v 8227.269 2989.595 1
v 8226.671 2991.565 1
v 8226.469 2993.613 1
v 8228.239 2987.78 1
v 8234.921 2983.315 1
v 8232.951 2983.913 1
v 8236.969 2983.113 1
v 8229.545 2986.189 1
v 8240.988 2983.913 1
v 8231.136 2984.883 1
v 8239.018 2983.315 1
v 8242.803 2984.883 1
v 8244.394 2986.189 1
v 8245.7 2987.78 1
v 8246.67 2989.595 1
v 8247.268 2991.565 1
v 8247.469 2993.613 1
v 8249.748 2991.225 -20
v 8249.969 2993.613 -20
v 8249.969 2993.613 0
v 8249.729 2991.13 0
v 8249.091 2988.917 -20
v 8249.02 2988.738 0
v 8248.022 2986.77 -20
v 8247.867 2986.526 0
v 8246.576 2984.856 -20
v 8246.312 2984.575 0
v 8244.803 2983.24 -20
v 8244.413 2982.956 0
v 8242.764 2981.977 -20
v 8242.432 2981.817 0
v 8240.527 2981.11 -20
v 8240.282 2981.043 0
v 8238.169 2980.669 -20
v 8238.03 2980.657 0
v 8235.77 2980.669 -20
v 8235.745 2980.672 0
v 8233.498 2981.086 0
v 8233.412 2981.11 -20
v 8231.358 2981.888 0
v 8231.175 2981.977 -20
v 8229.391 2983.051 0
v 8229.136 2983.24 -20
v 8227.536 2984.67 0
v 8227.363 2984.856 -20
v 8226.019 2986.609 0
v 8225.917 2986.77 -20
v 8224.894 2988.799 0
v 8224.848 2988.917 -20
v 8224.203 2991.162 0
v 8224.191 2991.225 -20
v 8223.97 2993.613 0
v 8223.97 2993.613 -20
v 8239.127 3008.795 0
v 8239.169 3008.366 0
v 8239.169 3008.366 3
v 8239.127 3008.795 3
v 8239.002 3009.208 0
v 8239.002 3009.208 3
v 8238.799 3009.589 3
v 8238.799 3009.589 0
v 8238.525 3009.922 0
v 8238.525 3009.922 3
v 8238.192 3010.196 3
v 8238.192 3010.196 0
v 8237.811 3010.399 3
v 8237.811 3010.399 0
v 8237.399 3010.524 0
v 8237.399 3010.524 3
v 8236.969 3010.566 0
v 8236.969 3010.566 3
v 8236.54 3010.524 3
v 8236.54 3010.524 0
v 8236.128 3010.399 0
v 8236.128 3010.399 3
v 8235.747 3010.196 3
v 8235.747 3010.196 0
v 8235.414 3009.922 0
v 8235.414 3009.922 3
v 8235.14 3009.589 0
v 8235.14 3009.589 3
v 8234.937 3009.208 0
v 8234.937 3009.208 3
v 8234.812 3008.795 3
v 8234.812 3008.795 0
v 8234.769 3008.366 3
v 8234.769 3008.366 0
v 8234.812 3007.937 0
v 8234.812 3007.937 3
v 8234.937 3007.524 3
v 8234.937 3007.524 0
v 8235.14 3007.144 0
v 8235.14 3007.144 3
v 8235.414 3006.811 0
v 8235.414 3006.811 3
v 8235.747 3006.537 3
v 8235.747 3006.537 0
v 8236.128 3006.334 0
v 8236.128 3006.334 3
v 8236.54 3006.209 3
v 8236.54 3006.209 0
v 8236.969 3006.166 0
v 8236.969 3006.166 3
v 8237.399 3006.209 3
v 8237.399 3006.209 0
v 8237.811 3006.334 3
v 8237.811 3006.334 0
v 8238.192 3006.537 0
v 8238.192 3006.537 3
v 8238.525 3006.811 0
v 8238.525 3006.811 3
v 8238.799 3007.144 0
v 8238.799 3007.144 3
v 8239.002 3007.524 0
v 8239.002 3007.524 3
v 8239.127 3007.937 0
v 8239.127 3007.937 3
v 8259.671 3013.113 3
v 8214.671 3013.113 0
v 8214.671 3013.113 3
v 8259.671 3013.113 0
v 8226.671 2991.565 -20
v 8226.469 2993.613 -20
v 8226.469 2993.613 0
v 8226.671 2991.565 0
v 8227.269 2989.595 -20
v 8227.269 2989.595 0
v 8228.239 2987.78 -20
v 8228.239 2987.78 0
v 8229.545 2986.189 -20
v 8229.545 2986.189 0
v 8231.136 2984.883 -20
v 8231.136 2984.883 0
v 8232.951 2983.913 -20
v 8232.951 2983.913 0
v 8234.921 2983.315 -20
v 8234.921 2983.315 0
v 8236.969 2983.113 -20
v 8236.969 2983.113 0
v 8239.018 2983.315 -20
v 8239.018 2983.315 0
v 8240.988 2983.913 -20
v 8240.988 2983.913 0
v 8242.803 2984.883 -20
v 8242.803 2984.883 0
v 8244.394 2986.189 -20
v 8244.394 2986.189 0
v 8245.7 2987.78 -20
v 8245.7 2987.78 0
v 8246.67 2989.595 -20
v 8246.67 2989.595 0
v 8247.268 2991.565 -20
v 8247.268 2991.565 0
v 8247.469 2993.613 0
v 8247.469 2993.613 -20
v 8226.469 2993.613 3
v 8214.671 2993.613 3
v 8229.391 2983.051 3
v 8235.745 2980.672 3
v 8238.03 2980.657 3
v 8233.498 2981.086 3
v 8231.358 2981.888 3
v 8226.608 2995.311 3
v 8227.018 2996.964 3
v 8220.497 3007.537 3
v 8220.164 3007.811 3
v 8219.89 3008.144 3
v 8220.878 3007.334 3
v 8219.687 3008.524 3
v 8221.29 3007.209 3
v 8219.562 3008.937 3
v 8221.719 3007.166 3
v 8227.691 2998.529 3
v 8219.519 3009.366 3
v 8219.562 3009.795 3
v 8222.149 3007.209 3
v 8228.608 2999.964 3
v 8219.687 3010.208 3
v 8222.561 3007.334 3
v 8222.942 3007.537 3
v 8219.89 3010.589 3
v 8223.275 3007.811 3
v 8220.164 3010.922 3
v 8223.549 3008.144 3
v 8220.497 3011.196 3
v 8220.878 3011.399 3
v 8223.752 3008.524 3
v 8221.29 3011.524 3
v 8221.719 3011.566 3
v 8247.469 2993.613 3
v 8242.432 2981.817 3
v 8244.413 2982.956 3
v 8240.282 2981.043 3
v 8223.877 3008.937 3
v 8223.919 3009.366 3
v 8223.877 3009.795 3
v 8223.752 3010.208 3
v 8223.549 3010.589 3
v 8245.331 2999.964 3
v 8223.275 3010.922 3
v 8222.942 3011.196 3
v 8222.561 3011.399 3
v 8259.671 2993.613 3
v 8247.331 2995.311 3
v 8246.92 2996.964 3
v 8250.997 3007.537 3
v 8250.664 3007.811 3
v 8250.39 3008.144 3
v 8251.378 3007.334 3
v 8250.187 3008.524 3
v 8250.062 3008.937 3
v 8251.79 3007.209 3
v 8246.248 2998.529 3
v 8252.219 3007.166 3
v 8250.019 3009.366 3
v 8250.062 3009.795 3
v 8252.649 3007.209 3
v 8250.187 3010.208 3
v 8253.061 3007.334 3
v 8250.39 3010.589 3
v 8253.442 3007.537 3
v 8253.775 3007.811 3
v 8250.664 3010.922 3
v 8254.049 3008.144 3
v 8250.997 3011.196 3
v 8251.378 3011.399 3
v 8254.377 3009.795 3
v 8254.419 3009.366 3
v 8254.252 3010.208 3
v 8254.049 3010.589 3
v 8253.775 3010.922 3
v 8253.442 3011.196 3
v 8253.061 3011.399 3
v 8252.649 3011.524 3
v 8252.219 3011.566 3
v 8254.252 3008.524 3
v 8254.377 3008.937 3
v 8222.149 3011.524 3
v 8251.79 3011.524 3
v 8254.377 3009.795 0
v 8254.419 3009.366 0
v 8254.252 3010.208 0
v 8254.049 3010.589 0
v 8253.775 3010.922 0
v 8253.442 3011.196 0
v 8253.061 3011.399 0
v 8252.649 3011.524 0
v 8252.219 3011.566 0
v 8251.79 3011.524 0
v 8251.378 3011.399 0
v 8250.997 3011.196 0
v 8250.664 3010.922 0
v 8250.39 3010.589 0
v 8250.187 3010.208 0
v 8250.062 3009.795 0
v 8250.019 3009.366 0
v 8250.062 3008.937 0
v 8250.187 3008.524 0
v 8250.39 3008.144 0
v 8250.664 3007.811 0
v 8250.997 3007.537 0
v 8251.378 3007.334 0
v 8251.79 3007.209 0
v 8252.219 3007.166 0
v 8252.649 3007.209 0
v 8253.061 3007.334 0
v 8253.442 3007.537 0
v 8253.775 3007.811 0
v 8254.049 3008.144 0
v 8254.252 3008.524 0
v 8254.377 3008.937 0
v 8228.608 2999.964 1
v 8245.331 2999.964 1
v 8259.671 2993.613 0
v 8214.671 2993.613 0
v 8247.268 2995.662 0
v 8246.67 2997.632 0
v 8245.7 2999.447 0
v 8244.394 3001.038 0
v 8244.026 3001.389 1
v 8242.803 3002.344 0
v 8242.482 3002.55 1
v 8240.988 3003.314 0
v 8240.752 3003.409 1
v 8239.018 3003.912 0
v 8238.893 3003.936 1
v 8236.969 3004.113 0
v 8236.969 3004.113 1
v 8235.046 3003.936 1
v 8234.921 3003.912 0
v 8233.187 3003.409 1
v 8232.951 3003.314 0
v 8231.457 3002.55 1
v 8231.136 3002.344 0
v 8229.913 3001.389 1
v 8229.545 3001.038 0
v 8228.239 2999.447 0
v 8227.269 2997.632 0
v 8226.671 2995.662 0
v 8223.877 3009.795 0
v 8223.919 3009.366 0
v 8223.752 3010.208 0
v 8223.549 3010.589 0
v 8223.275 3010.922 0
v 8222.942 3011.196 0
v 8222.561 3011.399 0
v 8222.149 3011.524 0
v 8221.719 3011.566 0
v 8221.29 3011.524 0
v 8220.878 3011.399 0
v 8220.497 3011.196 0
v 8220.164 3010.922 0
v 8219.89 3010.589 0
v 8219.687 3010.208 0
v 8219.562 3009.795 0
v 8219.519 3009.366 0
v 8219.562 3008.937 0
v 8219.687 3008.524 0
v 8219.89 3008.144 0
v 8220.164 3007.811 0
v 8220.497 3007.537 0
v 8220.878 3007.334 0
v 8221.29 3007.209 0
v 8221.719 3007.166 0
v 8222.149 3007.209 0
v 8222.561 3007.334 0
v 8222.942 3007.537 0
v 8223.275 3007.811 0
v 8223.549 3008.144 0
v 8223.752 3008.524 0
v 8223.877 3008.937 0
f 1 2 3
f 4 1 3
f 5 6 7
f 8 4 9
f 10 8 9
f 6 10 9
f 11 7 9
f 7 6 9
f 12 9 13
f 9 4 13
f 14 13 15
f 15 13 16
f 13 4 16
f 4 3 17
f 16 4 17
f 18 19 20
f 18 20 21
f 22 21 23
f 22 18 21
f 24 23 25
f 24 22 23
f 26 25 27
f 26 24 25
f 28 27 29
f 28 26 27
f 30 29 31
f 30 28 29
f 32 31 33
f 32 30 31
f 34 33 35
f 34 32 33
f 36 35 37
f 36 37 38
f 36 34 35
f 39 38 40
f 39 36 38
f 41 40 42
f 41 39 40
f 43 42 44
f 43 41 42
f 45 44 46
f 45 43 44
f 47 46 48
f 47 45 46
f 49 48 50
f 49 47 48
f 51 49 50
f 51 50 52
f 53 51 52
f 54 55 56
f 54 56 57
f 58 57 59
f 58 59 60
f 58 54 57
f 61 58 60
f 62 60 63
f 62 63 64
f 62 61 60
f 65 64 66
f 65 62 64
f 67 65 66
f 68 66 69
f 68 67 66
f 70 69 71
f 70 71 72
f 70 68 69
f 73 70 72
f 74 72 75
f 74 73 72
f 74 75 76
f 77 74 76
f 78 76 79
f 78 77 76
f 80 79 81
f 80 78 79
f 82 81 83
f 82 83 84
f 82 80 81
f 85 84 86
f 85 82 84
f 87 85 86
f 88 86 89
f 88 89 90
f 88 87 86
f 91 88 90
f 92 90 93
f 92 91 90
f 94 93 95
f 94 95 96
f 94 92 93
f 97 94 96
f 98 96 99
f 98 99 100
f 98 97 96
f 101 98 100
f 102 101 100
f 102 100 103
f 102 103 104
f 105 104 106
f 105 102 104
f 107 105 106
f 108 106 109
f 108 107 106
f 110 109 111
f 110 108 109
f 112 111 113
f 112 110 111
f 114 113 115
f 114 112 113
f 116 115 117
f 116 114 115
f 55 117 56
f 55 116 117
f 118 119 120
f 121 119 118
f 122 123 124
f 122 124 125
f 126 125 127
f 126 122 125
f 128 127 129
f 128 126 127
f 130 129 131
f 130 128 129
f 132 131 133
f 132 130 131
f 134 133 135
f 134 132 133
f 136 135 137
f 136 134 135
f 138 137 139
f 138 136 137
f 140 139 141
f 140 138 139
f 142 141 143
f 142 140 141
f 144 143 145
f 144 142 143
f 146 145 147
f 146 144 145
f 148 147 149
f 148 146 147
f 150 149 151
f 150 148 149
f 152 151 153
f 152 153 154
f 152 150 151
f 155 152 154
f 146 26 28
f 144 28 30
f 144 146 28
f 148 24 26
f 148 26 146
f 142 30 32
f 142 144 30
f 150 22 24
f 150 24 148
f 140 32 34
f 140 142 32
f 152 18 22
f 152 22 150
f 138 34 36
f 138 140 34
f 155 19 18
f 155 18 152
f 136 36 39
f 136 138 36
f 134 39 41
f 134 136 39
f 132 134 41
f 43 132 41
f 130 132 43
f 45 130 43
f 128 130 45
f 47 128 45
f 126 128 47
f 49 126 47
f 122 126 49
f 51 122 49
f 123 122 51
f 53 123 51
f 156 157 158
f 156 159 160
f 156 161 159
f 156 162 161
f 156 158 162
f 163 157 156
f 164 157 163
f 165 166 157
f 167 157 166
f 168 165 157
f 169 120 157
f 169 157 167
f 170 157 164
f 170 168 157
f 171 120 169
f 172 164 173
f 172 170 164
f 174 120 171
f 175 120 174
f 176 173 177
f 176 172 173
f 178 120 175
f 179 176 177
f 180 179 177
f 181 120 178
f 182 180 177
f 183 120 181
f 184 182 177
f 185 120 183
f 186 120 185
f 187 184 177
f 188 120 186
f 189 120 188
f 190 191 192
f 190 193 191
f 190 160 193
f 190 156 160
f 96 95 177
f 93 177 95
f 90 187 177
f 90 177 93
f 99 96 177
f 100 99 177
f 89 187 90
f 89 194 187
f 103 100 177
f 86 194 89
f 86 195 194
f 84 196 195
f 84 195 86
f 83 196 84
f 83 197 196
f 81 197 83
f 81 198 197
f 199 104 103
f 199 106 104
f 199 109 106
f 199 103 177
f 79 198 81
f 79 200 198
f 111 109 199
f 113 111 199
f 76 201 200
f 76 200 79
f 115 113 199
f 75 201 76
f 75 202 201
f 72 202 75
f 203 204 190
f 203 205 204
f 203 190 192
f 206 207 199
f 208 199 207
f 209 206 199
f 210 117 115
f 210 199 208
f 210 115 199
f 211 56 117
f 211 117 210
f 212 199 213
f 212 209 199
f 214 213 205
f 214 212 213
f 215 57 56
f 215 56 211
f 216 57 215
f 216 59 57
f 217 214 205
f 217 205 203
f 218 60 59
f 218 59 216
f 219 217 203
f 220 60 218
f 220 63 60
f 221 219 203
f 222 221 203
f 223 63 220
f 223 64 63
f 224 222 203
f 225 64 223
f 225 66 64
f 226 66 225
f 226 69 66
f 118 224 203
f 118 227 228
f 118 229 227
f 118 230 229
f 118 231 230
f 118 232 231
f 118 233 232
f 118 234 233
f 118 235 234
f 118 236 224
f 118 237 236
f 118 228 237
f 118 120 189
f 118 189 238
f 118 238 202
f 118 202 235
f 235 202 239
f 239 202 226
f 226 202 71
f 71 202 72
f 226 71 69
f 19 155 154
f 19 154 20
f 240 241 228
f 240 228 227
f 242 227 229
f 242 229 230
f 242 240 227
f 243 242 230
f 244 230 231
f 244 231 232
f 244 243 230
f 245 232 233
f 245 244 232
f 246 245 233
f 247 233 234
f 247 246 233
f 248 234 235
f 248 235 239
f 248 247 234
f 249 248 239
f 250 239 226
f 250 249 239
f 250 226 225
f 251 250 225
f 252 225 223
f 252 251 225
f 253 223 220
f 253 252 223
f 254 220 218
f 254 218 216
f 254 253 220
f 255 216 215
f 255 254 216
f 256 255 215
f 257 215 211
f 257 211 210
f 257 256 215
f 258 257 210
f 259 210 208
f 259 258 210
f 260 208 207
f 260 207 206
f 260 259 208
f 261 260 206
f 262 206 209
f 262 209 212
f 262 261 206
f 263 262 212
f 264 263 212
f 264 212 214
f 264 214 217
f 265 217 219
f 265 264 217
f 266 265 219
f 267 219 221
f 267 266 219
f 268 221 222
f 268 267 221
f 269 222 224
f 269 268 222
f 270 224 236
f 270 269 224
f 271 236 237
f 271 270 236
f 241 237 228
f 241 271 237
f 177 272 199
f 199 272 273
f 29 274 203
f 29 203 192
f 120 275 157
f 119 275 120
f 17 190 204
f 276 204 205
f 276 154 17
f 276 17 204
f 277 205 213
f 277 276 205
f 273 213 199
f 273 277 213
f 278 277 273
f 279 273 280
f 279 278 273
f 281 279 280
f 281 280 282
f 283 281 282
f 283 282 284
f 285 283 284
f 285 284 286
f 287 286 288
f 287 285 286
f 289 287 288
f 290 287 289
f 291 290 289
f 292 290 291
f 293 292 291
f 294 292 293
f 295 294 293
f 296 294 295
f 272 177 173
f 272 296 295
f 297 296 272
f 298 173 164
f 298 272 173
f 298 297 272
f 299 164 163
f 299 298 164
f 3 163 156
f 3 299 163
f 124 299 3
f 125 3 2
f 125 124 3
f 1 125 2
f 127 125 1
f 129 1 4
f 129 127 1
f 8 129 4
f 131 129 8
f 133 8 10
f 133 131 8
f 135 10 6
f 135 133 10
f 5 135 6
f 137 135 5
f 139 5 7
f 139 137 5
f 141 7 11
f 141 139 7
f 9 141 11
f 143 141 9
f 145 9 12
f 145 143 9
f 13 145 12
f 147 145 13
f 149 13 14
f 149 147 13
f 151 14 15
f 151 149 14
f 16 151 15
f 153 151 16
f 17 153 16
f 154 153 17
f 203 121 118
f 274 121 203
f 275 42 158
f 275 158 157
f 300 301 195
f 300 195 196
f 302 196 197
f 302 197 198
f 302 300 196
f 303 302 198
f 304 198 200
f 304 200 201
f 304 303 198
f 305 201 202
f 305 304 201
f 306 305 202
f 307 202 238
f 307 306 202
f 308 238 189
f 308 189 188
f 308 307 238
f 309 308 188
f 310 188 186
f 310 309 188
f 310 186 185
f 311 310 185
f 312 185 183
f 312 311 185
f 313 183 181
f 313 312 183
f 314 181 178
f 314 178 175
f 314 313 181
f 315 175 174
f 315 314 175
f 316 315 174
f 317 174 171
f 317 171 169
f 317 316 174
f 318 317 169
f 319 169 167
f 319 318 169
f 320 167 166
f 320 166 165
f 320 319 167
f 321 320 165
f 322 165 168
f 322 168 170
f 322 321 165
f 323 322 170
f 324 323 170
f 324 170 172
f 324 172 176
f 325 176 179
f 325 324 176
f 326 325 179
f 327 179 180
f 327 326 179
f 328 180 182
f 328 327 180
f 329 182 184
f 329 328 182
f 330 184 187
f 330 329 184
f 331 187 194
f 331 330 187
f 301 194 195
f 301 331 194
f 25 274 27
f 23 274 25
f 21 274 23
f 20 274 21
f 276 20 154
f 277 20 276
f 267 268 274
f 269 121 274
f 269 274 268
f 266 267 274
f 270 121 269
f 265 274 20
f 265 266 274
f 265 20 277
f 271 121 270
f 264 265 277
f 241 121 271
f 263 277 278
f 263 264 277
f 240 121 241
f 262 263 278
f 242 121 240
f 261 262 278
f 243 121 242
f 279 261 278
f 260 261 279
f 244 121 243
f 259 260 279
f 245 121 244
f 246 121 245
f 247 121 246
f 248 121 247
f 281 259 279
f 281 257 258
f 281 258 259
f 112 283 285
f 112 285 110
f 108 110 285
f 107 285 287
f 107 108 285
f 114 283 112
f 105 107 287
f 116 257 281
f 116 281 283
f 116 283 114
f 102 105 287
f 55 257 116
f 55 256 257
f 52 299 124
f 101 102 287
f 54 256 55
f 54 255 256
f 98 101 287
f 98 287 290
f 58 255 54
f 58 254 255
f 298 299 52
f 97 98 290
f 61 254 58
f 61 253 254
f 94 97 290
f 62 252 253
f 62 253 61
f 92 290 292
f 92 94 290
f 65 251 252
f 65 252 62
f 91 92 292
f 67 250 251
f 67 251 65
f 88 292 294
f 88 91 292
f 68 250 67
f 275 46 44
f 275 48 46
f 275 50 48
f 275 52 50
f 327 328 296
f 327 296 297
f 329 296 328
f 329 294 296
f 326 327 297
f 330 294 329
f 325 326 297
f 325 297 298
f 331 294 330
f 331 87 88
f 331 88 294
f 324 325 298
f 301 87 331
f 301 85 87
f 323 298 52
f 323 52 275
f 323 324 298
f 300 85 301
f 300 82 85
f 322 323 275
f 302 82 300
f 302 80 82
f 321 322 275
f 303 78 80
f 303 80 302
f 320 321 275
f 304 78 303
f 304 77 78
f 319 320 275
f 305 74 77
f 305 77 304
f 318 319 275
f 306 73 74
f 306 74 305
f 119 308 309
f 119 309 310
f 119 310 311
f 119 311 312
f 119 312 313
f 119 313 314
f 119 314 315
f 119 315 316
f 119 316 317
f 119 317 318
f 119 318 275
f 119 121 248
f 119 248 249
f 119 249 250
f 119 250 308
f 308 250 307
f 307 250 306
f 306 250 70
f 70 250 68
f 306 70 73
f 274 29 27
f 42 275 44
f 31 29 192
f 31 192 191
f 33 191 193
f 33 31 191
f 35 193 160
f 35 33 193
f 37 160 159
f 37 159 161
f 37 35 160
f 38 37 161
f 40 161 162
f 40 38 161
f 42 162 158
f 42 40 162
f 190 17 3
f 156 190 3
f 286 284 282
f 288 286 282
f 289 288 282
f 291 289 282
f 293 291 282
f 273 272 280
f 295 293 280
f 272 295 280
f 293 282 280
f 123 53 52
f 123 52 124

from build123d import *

# Parameters (mm, degrees)
SKETCH_2_R      = 10.5
SKETCH_2_R_2    = 2.2
EXTRUDE_1_DEPTH = 3
EXTRUDE_START   = -2
EXTRUDE_3_DEPTH = 2
EXTRUDE_START_2 = 20
EXTRUDE_5_DEPTH = 20


with BuildPart() as part:
    # 草图2 → 凸台-拉伸1 (new body)
    with BuildSketch(Plane.XY):
        with BuildLine():
            Line((8214.670798087, 3013.113410171), (8259.670798087, 3013.113410171))
            Line((8259.670798087, 3013.113410171), (8259.670798087, 2993.613410171))
            Line((8259.670798087, 2993.613410171), (8244.413270011, 2982.956276447))
            ThreePointArc((8244.413270011, 2982.956276447), (8236.88707696, 2980.614241973), (8229.391164024, 2983.051452794))
            Line((8229.391164024, 2983.051452794), (8214.670798087, 2993.613410171))
            Line((8214.670798087, 2993.613410171), (8214.670798087, 3013.113410171))
        make_face()
        with Locations((8236.969436473, 2993.613410171)):
            Circle(SKETCH_2_R, mode=Mode.SUBTRACT)
        with Locations((8236.969436473, 3008.366275847)):
            Circle(SKETCH_2_R_2, mode=Mode.SUBTRACT)
        with Locations((8221.719436473, 3009.366275847)):
            Circle(SKETCH_2_R_2, mode=Mode.SUBTRACT)
        with Locations((8252.219436473, 3009.366275847)):
            Circle(SKETCH_2_R_2, mode=Mode.SUBTRACT)
    extrude(amount=EXTRUDE_1_DEPTH)

    # 草图3 → 凸台-拉伸3 (add)
    with BuildSketch(Plane.XY.offset(3).offset(EXTRUDE_START)):
        with BuildLine():
            Line((8247.469436473, 2993.613410171), (8226.469436473, 2993.613410171))
            ThreePointArc((8226.469436473, 2993.613410171), (8236.969436473, 2983.113410171), (8247.469436473, 2993.613410171))
        make_face()
        with BuildLine():
            Line((8228.607869965, 2999.9643318), (8245.331002981, 2999.9643318))
            ThreePointArc((8245.331002981, 2999.9643318), (8236.969436473, 3004.113410171), (8228.607869965, 2999.9643318))
        make_face()
    extrude(amount=EXTRUDE_3_DEPTH)

    # 草图5 → 凸台-拉伸5 (add)
    with BuildSketch(Plane(origin=(0, 0, 0), x_dir=(-1, 0, 0), z_dir=(0, 0, -1)).offset(EXTRUDE_START_2)):
        with BuildLine():
            Line((-8247.469436473, 2993.613410171), (-8249.968865573, 2993.613410171))
            ThreePointArc((-8249.968865573, 2993.613410171), (-8236.969436473, 2980.61398107), (-8223.970007373, 2993.613410171))
            Line((-8223.970007373, 2993.613410171), (-8226.469436473, 2993.613410171))
            ThreePointArc((-8226.469436473, 2993.613410171), (-8236.969436473, 2983.113410171), (-8247.469436473, 2993.613410171))
        make_face()
    extrude(amount=-EXTRUDE_5_DEPTH)


solid = part.part
